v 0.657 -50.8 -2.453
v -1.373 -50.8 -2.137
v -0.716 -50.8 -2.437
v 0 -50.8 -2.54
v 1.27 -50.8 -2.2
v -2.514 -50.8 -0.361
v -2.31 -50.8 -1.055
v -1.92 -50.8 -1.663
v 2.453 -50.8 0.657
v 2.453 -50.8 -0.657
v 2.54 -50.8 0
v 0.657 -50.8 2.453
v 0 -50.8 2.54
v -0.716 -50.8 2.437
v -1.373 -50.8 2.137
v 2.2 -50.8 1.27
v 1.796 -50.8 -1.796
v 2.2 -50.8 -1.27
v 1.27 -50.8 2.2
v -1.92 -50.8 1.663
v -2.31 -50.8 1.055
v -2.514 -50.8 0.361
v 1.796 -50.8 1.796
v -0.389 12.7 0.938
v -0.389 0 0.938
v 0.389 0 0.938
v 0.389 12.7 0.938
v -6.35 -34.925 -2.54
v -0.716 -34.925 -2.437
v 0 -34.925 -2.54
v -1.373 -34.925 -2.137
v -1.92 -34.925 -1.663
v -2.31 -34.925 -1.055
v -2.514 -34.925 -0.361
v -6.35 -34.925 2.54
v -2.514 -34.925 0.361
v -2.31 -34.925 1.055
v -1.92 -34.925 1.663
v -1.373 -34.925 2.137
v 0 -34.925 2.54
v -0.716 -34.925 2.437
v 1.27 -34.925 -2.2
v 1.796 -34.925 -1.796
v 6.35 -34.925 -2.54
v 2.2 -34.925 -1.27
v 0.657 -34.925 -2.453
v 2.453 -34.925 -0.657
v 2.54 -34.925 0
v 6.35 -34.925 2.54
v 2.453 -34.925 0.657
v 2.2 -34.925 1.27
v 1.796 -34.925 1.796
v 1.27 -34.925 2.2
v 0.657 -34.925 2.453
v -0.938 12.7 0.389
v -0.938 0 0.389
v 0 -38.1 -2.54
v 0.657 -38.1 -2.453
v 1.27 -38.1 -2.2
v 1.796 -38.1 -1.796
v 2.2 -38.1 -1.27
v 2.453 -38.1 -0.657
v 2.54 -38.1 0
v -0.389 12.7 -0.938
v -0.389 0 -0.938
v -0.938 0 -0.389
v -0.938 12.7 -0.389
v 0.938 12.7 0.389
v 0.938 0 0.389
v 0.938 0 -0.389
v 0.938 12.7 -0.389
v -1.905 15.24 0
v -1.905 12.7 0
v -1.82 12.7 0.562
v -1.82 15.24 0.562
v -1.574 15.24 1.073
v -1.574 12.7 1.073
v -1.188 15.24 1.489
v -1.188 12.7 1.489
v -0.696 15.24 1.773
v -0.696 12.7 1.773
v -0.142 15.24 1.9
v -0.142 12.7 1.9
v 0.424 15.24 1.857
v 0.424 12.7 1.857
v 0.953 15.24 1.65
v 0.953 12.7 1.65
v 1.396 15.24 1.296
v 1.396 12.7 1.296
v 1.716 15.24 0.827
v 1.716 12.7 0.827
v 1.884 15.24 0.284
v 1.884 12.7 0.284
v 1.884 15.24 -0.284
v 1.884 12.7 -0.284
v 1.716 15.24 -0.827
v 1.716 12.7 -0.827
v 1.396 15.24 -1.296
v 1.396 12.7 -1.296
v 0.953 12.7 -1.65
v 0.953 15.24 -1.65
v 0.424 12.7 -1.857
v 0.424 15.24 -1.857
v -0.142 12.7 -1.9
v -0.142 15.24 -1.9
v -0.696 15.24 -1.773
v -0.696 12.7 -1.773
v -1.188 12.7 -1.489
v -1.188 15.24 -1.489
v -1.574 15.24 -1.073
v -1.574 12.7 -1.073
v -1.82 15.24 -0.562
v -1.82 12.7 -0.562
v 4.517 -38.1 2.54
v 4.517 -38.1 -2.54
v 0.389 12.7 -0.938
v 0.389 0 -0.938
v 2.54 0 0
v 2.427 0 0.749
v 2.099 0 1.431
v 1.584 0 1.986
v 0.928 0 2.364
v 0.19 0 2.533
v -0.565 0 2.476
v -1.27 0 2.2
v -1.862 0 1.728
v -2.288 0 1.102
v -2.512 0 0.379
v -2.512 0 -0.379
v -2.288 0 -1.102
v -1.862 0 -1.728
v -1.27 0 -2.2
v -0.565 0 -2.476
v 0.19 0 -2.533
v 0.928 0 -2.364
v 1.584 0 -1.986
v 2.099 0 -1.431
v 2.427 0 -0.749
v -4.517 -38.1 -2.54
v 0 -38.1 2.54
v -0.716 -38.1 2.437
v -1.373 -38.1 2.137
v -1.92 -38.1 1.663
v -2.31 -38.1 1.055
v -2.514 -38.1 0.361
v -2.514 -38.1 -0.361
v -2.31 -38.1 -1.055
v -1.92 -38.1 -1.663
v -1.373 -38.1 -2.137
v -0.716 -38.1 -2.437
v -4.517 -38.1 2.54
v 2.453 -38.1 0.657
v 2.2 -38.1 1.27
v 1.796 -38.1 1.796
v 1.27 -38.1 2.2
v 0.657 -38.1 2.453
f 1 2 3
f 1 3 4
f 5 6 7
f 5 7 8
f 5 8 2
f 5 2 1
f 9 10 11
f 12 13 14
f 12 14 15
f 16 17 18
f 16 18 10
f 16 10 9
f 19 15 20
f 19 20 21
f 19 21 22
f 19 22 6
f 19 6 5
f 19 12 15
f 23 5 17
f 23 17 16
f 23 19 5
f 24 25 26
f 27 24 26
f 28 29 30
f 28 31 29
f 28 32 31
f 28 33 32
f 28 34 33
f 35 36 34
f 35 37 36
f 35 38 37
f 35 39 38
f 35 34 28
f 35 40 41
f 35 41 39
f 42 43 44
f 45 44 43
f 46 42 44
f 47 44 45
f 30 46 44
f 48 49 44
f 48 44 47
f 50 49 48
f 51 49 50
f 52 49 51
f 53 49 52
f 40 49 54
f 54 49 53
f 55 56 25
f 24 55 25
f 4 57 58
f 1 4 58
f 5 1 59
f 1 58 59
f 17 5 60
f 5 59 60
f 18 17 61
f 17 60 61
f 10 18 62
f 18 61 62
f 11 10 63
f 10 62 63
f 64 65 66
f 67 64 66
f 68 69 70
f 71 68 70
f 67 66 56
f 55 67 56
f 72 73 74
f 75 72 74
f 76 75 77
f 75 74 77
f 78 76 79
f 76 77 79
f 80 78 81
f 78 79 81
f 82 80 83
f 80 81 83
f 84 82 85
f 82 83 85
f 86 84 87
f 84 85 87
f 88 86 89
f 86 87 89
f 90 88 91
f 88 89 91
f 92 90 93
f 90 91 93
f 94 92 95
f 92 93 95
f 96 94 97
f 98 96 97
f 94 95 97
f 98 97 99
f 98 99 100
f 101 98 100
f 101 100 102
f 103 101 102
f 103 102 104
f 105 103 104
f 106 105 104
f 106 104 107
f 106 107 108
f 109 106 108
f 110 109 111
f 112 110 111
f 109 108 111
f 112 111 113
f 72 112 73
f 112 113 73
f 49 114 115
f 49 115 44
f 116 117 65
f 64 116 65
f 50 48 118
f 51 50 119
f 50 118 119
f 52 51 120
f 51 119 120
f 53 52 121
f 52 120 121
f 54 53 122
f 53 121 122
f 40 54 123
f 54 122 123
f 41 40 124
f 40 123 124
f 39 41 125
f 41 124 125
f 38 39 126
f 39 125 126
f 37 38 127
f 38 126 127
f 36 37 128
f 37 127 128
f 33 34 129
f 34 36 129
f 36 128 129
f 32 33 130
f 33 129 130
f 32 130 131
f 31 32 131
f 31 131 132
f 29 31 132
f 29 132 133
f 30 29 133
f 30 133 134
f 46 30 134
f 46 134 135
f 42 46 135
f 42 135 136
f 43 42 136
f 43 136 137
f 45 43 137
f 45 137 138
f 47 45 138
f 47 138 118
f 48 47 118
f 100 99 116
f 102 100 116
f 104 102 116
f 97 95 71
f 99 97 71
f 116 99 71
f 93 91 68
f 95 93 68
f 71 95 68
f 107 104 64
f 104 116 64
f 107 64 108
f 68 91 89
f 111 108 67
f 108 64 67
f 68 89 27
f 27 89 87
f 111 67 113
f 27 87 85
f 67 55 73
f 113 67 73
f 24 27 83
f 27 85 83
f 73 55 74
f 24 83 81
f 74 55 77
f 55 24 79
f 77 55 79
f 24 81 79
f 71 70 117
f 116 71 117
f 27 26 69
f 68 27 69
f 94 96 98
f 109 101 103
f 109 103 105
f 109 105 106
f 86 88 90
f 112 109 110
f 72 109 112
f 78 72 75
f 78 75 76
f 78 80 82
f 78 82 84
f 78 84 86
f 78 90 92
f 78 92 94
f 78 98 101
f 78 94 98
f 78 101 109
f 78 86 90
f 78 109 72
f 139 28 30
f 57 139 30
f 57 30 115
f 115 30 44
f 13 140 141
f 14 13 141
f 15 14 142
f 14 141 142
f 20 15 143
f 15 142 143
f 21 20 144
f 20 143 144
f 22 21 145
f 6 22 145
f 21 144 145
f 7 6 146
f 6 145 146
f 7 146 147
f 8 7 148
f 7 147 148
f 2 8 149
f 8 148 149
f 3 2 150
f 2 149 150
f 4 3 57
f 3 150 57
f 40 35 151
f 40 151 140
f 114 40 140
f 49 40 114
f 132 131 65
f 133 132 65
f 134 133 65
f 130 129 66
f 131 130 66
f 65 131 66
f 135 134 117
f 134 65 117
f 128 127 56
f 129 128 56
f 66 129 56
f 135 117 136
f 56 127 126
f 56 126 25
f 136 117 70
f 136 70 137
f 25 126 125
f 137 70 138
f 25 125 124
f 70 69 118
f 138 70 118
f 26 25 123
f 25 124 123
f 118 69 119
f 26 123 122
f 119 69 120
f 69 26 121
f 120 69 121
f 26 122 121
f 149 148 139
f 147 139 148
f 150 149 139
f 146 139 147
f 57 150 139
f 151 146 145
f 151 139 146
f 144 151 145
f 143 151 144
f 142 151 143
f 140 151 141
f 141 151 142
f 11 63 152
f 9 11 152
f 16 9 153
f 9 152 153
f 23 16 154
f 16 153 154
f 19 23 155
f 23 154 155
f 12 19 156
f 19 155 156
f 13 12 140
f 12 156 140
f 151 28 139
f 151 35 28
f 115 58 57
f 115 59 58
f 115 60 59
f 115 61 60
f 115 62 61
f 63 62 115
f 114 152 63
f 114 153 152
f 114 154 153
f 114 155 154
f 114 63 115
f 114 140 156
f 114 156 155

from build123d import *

# Parameters (mm, degrees)
F0_R     = 2.54
F1_DEPTH = 38.1
F3_DEPTH = 12.7
F4_R     = 1.905
F5_DEPTH = 2.54
F7_DEPTH = 2.54
F9_DEPTH = 12.7


with BuildPart() as f1:
    # F0 (on Front) → F1 (new body)
    with BuildSketch(Plane.XZ):
        Circle(F0_R)
    extrude(amount=F1_DEPTH)

    # F2 (on face) → F3 (join)
    with BuildSketch(Plane(origin=(0, 0, 0), x_dir=(-1, 0, 0), z_dir=(0, 1, 0))):
        Polygon((0.3885612228, 0.9380697738), (-0.3885612228, 0.9380697738), (-0.9380697738, 0.3885612228), (-0.9380697738, -0.3885612228), (-0.3885612228, -0.9380697738), (0.3885612228, -0.9380697738), (0.9380697738, -0.3885612228), (0.9380697738, 0.3885612228), align=None)
    extrude(amount=F3_DEPTH)

    # F4 (on face) → F5 (join)
    with BuildSketch(Plane(origin=(0, 12.7, 0), x_dir=(-1, 0, 0), z_dir=(0, 1, 0))):
        Circle(F4_R)
        Polygon((0.3885612228, 0.9380697738), (0.9380697738, 0.3885612228), (0.9380697738, -0.3885612228), (0.3885612228, -0.9380697738), (-0.3885612228, -0.9380697738), (-0.9380697738, -0.3885612228), (-0.9380697738, 0.3885612228), (-0.3885612228, 0.9380697738), align=None, mode=Mode.SUBTRACT)
        Polygon((0.9380697738, -0.3885612228), (0.9380697738, 0.3885612228), (0.3885612228, 0.9380697738), (-0.3885612228, 0.9380697738), (-0.9380697738, 0.3885612228), (-0.9380697738, -0.3885612228), (-0.3885612228, -0.9380697738), (0.3885612228, -0.9380697738), align=None)
    extrude(amount=F5_DEPTH)

    # F6 (on Top) → F7 (join, symmetric)
    with BuildSketch(Plane.XY):
        Polygon((0, -38.1), (0, -34.925), (-6.35, -34.925), (-4.5169128953, -38.1), align=None)
        Polygon((6.35, -34.925), (0, -34.925), (0, -38.1), (4.5169128953, -38.1), align=None)
    extrude(amount=F7_DEPTH, both=True)

    # F8 (on face) → F9 (join)
    with BuildSketch(Plane.XZ.offset(38.1)):
        with BuildLine():
            ThreePointArc((0, -2.54), (1.7960512242, -1.7960512242), (2.54, 0))
            ThreePointArc((2.54, 0), (1.7960512242, 1.7960512242), (0, 2.54))
            ThreePointArc((0, 2.54), (-2.54, 0), (0, -2.54))
        make_face()
    extrude(amount=F9_DEPTH)


solid = f1.part
